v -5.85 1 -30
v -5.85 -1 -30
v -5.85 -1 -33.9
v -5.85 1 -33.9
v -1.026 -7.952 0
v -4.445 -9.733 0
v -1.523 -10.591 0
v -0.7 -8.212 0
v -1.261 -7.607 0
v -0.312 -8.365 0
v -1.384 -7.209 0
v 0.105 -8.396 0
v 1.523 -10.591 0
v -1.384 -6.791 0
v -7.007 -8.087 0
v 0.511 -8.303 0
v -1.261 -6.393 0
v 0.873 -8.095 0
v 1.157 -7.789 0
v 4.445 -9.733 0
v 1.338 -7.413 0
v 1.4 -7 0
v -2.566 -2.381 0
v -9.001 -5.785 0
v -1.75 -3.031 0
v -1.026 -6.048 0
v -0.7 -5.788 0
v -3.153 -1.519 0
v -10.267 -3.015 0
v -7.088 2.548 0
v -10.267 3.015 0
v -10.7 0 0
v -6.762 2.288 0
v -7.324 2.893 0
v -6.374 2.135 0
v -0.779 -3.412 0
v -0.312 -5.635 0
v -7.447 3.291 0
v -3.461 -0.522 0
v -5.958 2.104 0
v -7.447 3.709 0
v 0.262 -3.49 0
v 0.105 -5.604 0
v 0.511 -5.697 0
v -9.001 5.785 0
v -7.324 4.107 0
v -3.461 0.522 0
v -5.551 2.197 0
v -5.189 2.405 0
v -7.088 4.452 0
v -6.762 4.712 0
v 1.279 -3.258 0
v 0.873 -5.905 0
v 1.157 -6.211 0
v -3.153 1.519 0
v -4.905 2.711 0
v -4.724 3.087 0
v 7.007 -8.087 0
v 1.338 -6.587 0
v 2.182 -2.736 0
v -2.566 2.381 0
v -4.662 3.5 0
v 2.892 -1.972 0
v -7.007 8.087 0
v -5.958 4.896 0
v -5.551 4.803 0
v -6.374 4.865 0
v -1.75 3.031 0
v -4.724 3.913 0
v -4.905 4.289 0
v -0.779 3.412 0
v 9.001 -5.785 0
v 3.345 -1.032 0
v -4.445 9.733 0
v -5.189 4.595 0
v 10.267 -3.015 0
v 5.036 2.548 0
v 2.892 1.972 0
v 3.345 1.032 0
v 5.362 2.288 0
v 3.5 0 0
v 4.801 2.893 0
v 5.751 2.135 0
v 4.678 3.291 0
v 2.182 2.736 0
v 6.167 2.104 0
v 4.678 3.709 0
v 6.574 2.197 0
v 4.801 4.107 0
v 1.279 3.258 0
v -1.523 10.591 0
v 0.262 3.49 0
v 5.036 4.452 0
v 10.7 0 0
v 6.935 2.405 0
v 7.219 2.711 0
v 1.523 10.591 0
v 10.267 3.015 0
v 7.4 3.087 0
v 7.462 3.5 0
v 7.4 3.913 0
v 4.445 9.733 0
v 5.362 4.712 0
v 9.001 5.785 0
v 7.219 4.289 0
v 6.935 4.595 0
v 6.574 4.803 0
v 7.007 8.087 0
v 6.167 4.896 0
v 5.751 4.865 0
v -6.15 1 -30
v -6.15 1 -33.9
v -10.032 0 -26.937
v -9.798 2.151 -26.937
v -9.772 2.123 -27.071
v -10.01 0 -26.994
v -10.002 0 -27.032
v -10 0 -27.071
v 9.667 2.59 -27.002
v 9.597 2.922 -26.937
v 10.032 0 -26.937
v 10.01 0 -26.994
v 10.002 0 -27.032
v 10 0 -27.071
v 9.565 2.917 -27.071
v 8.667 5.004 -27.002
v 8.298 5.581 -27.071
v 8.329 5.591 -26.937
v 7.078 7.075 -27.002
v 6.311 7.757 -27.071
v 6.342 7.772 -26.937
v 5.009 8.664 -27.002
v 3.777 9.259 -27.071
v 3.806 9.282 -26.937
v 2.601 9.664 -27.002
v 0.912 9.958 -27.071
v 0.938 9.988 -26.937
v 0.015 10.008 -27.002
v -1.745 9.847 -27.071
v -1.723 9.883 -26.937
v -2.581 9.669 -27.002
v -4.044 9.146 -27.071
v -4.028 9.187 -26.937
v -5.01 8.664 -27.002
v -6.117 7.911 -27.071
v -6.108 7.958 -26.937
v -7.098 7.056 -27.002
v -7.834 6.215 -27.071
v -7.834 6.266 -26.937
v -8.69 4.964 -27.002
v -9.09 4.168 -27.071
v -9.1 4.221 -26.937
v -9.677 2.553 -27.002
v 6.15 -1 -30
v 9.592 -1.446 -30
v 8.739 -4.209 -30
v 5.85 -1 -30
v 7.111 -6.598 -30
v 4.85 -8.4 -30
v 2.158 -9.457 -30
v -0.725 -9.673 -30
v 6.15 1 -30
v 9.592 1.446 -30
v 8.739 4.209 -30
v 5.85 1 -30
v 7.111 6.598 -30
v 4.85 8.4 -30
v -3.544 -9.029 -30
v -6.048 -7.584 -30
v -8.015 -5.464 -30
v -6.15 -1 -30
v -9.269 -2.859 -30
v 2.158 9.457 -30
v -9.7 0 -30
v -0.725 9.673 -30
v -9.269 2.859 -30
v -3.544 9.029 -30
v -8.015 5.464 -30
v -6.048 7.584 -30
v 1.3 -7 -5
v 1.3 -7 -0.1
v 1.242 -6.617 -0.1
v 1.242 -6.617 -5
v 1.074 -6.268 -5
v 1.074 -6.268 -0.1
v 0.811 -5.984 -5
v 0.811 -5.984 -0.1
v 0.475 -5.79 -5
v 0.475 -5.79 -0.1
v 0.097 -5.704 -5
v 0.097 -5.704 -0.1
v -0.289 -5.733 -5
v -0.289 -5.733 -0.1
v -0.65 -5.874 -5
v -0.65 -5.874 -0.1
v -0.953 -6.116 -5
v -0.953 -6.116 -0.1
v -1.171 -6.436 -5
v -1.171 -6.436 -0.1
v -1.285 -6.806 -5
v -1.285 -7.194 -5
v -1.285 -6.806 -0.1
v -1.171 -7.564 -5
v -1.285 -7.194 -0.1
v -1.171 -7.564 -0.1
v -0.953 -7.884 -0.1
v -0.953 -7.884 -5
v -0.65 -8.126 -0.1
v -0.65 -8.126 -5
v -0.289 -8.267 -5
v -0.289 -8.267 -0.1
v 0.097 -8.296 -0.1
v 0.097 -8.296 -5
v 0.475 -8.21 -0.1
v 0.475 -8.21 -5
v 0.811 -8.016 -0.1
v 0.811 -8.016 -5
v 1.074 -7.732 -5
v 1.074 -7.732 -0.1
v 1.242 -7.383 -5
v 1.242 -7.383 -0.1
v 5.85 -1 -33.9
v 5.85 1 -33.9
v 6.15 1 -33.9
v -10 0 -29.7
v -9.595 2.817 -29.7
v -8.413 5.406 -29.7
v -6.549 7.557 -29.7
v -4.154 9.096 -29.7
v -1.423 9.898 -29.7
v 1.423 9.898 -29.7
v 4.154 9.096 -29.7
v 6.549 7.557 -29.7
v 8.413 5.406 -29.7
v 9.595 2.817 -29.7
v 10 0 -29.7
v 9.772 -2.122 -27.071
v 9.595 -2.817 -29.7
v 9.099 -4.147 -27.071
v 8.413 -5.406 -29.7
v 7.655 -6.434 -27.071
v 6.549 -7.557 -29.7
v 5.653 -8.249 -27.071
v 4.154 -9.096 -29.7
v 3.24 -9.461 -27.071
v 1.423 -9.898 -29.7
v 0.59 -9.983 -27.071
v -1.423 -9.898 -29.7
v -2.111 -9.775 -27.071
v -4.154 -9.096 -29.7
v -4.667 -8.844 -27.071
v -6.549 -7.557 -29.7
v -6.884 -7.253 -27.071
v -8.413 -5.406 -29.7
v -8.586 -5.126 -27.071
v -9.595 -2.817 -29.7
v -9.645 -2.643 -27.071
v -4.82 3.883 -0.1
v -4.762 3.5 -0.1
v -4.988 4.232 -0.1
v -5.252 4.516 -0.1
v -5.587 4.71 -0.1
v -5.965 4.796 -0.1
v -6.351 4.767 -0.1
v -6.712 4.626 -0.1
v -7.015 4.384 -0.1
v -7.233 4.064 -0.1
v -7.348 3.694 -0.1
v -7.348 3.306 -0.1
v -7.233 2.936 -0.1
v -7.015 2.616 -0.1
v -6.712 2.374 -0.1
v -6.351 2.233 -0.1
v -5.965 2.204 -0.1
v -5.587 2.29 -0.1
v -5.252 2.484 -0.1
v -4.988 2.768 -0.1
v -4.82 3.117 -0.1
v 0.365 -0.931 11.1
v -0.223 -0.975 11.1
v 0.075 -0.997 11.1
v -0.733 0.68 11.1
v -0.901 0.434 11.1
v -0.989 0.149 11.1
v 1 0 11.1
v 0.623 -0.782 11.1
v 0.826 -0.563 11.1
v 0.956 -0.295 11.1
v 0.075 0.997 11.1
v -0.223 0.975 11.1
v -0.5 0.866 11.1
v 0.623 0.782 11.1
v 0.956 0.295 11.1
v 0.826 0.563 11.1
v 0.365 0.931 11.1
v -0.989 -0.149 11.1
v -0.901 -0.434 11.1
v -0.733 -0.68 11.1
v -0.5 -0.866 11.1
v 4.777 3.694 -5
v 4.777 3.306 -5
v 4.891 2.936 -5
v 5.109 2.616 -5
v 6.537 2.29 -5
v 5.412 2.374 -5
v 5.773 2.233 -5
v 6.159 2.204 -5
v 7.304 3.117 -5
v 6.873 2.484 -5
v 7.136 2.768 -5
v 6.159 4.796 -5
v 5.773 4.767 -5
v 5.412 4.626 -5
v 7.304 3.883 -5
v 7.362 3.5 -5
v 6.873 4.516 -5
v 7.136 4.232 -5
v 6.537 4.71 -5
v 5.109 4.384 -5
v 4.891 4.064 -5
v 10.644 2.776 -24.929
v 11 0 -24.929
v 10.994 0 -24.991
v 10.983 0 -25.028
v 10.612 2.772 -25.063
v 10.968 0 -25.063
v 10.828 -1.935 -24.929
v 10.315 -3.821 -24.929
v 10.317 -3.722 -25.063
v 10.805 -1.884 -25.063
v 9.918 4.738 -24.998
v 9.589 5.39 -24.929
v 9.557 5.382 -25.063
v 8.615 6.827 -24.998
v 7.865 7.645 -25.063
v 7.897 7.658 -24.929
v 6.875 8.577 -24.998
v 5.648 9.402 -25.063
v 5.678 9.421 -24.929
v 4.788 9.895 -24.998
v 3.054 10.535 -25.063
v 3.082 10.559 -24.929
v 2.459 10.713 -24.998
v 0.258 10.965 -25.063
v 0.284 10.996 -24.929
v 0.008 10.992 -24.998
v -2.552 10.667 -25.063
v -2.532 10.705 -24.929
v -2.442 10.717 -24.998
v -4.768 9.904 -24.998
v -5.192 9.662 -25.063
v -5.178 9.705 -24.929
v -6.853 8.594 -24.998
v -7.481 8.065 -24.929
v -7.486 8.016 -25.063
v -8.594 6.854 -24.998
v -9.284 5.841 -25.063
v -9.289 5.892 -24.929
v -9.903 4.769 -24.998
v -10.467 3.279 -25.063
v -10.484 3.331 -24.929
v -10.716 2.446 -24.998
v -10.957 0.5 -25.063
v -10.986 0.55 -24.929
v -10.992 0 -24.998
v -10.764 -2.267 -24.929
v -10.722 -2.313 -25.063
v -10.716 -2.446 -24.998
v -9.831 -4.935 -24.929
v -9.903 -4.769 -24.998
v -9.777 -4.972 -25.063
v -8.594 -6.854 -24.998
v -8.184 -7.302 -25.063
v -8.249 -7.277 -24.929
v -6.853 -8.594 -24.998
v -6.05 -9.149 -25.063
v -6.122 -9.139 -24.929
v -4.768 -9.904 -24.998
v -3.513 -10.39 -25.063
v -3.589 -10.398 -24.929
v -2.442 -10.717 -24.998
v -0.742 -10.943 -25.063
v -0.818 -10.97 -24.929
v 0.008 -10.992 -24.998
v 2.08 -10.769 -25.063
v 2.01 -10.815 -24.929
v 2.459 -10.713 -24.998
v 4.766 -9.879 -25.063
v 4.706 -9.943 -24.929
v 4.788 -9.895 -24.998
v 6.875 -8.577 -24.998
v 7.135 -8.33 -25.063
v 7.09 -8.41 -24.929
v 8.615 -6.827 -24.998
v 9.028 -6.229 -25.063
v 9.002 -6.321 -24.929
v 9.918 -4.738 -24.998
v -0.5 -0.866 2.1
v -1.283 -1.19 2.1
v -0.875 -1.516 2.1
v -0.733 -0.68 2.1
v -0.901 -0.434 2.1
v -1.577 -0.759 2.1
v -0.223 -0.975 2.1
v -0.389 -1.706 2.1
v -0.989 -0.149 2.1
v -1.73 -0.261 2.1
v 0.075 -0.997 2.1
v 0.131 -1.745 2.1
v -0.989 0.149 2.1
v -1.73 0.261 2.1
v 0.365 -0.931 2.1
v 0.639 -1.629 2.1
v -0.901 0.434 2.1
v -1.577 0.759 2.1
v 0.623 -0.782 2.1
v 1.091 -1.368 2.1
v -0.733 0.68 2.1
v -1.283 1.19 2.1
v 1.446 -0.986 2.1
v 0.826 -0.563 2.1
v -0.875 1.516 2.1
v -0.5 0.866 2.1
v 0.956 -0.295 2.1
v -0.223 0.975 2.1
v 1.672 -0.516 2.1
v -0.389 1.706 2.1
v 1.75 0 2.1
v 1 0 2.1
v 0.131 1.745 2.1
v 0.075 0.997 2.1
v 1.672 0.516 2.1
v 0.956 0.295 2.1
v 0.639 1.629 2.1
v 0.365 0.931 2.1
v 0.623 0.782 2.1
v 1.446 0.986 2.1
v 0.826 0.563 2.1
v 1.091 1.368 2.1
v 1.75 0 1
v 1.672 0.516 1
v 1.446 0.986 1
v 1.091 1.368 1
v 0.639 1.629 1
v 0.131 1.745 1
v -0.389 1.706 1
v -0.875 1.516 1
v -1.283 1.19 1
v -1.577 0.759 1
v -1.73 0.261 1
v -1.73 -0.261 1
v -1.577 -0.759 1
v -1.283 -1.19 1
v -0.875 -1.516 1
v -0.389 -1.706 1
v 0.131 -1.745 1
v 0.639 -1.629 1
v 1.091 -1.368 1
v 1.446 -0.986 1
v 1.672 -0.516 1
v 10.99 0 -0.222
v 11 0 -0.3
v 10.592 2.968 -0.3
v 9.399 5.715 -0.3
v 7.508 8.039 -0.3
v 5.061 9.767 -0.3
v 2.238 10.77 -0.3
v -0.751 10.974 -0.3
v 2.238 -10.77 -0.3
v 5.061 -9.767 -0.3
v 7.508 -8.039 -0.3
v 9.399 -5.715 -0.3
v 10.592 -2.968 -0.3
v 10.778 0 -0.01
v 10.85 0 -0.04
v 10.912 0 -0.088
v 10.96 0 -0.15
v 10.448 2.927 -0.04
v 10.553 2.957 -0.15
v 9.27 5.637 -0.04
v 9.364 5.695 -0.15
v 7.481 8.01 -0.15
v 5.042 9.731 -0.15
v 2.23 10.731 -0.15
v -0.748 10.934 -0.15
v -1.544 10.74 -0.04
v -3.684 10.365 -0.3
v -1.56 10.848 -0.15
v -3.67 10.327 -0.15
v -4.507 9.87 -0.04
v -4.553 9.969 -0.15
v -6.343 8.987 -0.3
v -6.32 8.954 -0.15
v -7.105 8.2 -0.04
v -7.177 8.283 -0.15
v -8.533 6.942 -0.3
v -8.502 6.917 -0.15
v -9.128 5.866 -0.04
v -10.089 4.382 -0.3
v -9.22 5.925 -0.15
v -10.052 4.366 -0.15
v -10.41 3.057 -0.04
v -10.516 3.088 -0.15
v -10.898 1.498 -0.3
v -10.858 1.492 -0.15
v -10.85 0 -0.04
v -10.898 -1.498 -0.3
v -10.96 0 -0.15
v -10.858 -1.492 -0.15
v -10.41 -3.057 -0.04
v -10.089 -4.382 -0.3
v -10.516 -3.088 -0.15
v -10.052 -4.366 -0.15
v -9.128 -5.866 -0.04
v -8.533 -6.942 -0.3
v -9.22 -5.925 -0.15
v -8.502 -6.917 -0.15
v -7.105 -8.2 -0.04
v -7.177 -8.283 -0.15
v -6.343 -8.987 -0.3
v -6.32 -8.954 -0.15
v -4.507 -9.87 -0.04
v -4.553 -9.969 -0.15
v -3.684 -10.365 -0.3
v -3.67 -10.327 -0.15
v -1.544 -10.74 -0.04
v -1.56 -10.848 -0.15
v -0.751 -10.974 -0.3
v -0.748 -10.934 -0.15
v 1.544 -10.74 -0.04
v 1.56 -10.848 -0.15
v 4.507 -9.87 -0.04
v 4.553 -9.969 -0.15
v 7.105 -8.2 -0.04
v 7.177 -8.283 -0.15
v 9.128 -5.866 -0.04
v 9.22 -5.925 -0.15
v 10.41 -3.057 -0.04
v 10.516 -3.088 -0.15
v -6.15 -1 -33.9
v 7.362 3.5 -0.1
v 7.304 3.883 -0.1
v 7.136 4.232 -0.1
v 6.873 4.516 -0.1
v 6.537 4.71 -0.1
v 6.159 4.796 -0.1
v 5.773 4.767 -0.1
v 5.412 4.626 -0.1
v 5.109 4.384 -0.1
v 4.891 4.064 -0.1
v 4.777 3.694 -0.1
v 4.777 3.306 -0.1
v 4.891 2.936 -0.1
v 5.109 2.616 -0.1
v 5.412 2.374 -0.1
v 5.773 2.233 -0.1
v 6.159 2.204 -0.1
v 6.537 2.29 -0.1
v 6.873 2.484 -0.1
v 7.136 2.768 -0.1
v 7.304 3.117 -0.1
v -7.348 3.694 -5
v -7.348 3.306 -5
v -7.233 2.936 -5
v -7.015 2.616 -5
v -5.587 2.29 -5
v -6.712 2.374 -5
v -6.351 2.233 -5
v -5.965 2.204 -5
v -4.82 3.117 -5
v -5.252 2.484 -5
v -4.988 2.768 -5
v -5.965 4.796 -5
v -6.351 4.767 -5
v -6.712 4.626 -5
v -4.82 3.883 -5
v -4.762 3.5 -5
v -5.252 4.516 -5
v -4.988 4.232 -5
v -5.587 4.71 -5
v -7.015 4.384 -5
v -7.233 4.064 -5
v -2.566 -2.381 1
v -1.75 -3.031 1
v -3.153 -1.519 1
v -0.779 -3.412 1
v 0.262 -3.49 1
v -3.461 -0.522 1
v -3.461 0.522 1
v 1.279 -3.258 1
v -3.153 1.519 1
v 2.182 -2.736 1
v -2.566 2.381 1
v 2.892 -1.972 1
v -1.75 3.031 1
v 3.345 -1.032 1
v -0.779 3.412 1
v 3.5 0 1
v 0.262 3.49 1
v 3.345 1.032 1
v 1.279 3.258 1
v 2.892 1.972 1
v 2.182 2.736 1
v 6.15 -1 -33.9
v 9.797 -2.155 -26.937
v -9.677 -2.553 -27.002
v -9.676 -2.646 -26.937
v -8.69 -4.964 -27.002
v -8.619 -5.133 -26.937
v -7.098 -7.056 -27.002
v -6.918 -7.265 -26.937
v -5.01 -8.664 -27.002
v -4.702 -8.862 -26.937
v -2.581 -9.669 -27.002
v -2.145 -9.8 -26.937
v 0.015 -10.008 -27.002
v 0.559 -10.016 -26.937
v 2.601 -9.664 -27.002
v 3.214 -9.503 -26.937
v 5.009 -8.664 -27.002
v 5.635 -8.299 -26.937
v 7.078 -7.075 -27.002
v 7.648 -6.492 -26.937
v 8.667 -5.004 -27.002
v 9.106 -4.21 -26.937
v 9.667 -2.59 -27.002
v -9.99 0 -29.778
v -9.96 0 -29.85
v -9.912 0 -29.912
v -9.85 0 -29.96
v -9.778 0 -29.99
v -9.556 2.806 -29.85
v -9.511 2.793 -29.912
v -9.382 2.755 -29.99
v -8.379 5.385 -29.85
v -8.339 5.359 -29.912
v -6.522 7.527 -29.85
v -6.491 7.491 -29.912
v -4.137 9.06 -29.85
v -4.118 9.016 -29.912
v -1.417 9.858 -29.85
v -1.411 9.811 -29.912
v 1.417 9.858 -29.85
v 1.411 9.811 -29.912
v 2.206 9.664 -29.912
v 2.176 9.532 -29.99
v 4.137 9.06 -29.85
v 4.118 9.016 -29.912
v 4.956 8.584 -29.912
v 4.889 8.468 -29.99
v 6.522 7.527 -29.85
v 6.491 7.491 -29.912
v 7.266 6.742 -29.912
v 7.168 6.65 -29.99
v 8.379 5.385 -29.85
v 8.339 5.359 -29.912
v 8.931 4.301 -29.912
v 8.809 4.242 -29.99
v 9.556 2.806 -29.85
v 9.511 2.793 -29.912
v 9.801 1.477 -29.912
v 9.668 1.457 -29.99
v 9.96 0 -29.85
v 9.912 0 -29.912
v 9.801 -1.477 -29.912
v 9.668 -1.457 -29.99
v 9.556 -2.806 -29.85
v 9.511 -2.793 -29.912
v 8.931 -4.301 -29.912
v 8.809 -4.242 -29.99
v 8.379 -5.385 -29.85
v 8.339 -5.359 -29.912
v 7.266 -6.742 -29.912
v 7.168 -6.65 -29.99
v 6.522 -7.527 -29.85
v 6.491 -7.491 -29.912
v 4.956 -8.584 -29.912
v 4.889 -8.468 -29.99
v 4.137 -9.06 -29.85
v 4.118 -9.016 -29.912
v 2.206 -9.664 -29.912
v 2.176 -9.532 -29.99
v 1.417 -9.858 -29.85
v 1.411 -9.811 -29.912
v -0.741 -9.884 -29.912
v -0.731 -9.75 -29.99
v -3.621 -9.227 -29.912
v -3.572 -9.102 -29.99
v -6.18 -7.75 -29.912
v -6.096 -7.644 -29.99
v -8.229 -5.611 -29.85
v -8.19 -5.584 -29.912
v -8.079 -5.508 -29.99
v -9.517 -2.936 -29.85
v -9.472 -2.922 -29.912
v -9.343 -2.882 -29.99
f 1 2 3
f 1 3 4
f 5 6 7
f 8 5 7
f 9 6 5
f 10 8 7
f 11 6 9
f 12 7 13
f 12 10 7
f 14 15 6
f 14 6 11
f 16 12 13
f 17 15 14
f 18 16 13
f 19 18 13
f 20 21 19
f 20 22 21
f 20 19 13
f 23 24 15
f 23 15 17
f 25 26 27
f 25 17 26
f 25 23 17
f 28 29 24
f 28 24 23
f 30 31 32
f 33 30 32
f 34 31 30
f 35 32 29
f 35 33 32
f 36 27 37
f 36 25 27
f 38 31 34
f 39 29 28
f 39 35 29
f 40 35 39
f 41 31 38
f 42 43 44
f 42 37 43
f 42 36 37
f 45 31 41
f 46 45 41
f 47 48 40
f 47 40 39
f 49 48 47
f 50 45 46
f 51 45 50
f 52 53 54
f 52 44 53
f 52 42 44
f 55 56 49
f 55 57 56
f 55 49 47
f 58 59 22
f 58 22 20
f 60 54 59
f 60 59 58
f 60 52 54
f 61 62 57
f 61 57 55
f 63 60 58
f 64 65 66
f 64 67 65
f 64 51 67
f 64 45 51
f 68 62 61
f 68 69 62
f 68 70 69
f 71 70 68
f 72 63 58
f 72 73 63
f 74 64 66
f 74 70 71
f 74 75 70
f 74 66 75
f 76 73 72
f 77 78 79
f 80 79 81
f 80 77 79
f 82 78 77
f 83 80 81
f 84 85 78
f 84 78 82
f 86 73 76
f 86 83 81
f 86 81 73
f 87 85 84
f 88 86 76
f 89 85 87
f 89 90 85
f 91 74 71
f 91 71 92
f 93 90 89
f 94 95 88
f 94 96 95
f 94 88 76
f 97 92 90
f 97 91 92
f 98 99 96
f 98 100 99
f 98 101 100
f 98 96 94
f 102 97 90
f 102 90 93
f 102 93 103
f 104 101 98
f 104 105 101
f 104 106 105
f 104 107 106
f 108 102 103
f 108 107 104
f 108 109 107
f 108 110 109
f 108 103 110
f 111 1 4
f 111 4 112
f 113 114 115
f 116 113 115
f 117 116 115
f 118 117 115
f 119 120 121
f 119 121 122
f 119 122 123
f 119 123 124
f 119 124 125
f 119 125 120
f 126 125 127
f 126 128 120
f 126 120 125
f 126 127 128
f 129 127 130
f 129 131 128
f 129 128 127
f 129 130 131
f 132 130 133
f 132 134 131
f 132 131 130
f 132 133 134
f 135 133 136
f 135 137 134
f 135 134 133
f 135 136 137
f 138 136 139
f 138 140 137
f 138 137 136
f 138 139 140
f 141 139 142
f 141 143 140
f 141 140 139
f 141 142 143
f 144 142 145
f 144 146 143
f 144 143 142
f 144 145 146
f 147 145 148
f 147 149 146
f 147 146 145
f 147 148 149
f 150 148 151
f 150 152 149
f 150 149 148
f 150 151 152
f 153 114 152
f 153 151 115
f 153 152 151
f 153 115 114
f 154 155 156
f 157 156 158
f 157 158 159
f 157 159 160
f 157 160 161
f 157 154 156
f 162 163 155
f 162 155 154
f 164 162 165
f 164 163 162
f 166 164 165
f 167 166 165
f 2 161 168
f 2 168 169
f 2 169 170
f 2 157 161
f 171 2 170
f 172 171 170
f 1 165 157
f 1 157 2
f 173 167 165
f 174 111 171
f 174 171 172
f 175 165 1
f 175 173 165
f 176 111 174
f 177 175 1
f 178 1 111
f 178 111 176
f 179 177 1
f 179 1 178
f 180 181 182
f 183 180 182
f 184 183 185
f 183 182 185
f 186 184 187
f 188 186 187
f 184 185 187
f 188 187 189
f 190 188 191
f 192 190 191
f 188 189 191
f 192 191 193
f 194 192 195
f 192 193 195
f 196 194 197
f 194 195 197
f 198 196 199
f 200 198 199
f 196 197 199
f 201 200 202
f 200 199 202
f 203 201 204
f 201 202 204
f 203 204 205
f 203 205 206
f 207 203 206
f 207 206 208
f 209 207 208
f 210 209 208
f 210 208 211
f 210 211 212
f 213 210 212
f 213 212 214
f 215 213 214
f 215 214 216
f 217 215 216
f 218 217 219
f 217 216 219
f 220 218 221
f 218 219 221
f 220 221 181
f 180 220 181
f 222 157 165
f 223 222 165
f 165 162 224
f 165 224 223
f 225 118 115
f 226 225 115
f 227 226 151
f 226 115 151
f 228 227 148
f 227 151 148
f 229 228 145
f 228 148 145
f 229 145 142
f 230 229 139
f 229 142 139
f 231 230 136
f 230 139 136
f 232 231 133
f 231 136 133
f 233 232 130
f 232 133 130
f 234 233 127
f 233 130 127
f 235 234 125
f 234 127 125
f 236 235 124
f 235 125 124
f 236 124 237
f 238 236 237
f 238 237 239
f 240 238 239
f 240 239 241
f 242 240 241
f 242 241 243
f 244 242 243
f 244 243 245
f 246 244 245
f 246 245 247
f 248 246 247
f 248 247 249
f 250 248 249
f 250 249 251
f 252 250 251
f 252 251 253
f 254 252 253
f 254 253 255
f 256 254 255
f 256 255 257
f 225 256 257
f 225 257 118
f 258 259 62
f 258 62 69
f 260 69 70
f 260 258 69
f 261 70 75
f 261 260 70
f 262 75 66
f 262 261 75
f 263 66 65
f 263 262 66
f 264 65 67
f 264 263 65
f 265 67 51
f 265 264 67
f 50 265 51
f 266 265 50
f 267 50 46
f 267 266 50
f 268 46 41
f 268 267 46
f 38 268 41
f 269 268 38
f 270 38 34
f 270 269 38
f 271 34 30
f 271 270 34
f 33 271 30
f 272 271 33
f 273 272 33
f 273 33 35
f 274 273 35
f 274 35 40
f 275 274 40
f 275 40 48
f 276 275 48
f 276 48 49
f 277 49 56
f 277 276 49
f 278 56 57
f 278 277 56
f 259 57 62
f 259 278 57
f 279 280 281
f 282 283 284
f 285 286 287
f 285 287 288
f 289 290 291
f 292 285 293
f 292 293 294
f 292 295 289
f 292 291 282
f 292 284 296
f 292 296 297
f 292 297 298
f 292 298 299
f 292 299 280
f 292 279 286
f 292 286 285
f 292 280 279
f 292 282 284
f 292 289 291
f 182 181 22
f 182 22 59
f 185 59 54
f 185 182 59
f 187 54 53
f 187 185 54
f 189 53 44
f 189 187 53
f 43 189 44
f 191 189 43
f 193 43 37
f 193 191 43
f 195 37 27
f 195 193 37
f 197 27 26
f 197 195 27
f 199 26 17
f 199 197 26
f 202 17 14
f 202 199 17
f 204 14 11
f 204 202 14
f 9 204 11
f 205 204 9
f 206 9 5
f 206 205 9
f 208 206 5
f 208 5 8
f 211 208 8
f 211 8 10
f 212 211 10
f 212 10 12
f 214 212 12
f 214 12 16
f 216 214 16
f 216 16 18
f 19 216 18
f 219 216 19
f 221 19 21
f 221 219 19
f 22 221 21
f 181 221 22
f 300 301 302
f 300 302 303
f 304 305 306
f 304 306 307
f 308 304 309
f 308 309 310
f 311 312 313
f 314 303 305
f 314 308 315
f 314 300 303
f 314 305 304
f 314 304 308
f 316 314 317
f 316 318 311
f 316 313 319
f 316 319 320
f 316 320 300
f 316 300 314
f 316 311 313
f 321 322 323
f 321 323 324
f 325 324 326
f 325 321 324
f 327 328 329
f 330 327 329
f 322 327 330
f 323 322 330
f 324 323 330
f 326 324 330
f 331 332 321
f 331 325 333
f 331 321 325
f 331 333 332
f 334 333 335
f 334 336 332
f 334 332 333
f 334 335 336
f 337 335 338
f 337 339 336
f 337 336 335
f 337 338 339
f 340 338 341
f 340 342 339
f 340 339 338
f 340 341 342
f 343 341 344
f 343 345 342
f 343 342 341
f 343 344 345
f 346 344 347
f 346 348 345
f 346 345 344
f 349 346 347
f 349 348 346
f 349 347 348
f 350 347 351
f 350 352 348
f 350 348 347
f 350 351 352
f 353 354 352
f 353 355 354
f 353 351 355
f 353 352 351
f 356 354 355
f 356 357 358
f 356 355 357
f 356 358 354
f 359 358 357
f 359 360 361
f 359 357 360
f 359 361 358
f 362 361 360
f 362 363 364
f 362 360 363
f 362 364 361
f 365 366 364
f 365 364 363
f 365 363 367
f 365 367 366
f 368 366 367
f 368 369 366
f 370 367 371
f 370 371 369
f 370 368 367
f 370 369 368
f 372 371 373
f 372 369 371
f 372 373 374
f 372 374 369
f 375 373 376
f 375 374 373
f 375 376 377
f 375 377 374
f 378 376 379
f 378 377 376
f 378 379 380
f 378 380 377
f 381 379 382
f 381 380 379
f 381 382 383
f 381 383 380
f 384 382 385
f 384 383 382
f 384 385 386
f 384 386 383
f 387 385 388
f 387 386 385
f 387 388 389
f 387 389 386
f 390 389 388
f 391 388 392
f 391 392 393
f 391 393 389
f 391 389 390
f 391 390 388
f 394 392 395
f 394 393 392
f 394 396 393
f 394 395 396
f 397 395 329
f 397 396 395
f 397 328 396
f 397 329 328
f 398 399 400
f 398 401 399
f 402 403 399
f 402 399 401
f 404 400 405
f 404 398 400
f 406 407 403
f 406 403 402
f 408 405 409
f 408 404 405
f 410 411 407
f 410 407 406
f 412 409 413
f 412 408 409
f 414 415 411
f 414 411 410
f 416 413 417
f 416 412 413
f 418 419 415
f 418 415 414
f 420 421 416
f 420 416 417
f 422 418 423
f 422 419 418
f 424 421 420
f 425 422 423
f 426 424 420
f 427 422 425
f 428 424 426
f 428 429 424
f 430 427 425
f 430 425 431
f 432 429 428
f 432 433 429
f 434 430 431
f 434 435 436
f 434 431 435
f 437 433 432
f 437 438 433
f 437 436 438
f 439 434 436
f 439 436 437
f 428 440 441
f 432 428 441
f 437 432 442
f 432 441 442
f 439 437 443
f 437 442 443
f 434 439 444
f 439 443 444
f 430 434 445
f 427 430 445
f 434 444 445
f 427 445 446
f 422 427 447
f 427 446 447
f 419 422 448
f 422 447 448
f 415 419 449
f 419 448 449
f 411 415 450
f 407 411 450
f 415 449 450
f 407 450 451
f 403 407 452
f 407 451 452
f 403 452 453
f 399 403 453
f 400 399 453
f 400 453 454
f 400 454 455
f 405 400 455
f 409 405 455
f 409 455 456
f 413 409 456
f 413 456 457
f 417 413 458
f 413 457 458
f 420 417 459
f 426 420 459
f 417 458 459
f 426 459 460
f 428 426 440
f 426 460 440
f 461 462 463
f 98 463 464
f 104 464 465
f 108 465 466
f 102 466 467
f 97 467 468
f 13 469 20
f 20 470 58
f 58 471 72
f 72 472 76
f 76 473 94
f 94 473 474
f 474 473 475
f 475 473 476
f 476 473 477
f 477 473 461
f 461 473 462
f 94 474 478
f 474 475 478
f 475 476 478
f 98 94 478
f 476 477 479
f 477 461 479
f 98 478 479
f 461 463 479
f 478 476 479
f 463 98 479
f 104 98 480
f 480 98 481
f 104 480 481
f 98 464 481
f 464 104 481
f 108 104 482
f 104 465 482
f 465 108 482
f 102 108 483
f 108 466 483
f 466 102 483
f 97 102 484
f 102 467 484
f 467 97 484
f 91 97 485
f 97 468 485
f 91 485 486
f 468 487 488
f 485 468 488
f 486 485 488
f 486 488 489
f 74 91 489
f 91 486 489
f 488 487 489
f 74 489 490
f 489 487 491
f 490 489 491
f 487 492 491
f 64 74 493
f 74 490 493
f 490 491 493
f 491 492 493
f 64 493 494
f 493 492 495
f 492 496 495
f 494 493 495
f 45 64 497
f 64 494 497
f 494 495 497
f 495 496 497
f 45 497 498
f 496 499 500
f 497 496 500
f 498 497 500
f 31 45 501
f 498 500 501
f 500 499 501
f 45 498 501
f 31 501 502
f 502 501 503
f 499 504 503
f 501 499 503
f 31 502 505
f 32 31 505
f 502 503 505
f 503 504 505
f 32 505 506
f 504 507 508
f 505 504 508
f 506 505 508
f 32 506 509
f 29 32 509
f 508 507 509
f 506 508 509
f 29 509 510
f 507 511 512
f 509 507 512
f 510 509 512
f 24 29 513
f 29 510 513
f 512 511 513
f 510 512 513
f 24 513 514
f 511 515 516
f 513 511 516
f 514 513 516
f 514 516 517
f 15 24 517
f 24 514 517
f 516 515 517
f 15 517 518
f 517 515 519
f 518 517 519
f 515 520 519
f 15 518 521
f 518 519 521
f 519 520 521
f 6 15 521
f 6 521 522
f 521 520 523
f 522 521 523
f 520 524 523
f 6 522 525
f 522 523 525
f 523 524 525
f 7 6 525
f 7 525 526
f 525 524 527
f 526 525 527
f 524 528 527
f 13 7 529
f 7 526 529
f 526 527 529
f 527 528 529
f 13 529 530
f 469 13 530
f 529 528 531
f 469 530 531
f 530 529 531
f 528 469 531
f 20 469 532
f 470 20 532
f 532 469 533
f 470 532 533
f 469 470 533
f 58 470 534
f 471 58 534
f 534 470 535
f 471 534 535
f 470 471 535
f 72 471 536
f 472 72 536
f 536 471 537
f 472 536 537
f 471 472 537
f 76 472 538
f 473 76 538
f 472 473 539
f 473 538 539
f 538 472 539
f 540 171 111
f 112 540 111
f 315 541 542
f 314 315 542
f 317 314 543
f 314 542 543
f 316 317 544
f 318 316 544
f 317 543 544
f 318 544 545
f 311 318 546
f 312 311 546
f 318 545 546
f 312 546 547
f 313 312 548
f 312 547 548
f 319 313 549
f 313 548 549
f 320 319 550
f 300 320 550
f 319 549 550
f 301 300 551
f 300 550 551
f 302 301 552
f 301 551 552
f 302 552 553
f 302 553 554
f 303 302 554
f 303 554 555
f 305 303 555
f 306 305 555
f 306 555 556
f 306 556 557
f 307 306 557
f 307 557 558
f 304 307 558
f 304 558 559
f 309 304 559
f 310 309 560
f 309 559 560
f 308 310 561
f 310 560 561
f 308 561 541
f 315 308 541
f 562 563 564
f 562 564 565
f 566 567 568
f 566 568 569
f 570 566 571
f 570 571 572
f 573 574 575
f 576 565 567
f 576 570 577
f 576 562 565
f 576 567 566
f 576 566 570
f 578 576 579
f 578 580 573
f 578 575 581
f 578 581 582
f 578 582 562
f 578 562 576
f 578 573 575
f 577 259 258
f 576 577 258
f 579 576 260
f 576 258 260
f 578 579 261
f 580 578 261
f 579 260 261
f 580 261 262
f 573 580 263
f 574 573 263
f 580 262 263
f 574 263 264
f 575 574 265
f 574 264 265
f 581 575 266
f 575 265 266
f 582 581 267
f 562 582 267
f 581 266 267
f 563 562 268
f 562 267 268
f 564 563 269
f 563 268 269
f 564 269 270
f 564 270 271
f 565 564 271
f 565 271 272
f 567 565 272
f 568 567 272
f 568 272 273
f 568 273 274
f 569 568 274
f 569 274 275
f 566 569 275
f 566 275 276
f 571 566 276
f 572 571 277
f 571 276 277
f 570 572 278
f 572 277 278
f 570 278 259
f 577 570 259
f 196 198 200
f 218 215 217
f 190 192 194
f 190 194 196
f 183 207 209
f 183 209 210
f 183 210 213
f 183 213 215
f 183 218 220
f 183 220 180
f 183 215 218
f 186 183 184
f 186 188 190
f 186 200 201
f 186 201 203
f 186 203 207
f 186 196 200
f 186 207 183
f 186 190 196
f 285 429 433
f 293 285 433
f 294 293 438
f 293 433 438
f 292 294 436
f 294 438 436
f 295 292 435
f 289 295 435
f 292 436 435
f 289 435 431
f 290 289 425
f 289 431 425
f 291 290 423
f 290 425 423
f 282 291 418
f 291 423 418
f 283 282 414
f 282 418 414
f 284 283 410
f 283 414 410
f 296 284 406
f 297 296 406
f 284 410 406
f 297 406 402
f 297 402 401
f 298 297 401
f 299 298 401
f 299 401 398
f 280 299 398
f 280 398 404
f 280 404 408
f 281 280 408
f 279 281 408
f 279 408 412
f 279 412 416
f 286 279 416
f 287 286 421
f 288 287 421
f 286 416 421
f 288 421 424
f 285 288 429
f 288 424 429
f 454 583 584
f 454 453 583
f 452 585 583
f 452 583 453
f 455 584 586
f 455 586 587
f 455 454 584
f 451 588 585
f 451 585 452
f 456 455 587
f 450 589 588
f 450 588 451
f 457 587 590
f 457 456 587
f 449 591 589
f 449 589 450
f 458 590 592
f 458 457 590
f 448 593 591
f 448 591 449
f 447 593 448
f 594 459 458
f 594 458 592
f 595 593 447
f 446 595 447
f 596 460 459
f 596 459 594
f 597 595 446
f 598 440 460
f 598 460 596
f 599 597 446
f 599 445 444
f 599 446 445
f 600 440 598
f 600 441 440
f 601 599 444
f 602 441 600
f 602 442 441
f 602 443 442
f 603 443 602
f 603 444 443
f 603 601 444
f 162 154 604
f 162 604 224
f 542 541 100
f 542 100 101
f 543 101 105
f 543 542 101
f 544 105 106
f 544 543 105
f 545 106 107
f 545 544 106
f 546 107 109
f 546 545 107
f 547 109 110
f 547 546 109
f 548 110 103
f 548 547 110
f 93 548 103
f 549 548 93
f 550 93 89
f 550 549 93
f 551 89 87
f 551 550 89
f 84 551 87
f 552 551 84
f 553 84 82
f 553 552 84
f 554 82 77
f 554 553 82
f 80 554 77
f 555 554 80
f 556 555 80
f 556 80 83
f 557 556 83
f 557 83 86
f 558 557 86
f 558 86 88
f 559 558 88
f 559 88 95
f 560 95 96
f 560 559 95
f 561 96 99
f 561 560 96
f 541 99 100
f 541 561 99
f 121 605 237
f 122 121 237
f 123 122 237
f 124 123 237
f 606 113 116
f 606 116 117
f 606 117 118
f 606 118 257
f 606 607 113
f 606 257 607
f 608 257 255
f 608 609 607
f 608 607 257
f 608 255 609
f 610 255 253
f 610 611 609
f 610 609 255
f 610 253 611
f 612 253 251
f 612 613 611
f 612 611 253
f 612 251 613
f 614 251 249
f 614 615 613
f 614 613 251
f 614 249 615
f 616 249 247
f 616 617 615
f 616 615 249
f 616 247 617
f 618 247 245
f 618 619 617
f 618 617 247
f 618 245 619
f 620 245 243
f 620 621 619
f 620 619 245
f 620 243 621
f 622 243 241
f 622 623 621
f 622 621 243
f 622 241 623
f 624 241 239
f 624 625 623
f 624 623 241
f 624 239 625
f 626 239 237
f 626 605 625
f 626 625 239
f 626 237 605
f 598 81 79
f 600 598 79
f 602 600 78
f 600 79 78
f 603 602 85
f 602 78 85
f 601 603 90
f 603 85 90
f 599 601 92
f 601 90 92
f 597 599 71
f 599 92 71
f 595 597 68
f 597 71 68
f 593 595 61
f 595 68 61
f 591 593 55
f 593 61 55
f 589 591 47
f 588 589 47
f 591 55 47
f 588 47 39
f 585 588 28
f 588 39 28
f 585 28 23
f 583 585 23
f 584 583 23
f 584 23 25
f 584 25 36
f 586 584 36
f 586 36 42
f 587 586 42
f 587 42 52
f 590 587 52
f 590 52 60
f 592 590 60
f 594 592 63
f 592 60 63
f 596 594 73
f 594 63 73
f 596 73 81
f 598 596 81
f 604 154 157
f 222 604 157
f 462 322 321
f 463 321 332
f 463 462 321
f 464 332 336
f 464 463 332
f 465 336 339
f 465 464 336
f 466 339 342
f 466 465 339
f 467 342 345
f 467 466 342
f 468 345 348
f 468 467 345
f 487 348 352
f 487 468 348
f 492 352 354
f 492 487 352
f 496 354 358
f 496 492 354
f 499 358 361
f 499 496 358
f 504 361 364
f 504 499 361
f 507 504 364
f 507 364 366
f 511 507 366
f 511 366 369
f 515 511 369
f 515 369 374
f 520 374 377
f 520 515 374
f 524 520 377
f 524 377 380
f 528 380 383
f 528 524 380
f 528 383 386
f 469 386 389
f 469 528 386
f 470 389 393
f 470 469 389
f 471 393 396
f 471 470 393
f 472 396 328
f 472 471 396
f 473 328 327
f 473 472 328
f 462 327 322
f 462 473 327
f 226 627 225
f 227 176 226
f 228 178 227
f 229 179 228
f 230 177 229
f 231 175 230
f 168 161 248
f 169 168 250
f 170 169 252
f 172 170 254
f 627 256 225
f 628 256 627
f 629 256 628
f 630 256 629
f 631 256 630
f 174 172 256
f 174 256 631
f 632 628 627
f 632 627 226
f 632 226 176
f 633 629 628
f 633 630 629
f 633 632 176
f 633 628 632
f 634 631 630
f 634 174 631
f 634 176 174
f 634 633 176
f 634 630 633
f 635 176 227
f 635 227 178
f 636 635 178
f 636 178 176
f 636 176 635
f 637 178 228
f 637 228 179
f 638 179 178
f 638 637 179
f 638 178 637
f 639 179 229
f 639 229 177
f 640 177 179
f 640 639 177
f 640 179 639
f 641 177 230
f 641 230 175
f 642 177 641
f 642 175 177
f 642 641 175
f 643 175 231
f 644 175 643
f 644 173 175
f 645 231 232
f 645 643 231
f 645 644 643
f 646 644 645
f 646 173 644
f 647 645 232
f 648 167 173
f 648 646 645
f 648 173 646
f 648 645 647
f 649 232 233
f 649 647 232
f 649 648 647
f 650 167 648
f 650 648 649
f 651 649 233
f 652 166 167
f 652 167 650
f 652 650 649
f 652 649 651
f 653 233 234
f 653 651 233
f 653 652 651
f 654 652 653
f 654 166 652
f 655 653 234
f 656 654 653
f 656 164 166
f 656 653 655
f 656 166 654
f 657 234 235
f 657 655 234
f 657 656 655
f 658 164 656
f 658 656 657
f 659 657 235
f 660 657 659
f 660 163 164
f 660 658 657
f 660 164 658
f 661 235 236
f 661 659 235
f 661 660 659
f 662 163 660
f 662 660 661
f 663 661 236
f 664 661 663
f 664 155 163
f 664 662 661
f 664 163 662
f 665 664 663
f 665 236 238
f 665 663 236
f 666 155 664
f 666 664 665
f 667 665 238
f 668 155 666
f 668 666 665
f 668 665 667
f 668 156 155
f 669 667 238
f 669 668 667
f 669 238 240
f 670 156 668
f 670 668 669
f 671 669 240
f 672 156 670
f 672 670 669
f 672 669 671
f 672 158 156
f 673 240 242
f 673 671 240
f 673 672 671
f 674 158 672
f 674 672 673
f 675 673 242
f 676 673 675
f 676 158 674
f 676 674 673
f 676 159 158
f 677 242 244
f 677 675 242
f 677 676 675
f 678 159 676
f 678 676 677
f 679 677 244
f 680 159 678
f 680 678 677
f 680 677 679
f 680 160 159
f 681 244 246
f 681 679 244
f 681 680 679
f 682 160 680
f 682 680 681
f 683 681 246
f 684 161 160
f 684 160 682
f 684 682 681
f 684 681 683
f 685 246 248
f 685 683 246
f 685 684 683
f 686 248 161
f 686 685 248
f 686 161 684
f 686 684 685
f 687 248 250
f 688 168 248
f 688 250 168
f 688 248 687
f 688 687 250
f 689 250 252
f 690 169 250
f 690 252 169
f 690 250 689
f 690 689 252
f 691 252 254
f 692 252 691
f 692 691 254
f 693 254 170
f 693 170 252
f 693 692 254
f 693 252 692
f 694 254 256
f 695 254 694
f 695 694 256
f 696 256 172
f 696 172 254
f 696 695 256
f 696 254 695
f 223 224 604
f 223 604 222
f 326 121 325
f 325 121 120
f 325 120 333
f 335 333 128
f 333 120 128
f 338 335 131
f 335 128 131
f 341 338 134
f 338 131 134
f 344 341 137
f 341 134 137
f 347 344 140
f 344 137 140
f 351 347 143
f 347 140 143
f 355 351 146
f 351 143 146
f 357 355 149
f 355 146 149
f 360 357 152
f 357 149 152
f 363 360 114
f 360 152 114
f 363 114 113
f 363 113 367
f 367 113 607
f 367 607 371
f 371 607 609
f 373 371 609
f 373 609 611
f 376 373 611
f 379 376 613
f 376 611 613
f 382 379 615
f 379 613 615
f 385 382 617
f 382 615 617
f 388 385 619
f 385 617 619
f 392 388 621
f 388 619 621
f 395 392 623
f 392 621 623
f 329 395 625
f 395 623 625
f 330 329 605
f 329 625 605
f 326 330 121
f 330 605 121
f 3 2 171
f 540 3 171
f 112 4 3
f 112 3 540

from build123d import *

# Parameters (mm, degrees)
SKETCH1_R           = 11
BOSS_EXTRUDE1_DEPTH = 25
SKETCH2_R           = 10
SKETCH3_R           = 10
BOSS_EXTRUDE2_DEPTH = 3
SKETCH4_R           = 1.3
CUT_EXTRUDE1_DEPTH  = 5
CHAMFER1_SIZE       = 0.1
SKETCH5_R           = 3.5
BOSS_EXTRUDE3_DEPTH = 1
SKETCH6_R           = 1.75
BOSS_EXTRUDE4_DEPTH = 1.1
SKETCH7_R           = 1
BOSS_EXTRUDE5_DEPTH = 9
SKETCH8_W           = 0.3
SKETCH8_H           = 2
BOSS_EXTRUDE6_DEPTH = 3.9
FILLET1_R           = 0.3


with BuildPart() as part:
    # Sketch1 → Boss-Extrude1 (new body)
    with BuildSketch(Plane.XY):
        Circle(SKETCH1_R)
    extrude(amount=-BOSS_EXTRUDE1_DEPTH)

    # Sketch2 → section 1 of loft1
    with BuildSketch(Plane(origin=(0, 0, -27), x_dir=(-1, 0, 0), z_dir=(0, 0, -1)), mode=Mode.PRIVATE) as loft1_s1:
        Circle(SKETCH2_R)
    # loft from a face of the part (loft1)
    loft([part.faces().sort_by_distance((0, 0, -25))[0], loft1_s1.sketch])

    # Sketch3 → Boss-Extrude2 (add)
    with BuildSketch(Plane(origin=(0, 0, -27), x_dir=(-1, 0, 0), z_dir=(0, 0, -1))):
        Circle(SKETCH3_R)
    extrude(amount=BOSS_EXTRUDE2_DEPTH)

    # Sketch4 → Cut-Extrude1 (cut)
    with BuildSketch(Plane.XY):
        with Locations((-6.062177826, 3.5)):
            Circle(SKETCH4_R)
        with Locations((6.062177826, 3.5)):
            Circle(SKETCH4_R)
        with Locations((0, -7)):
            Circle(SKETCH4_R)
    extrude(amount=-CUT_EXTRUDE1_DEPTH, mode=Mode.SUBTRACT)

    # Chamfer1
    chamfer1_edges = [part.edges().sort_by_distance(p)[0] for p in [
        (-7.362177826, 3.5, 0),
        (4.762177826, 3.5, 0),
        (-1.3, -7, 0),
    ]]
    chamfer(chamfer1_edges, length=CHAMFER1_SIZE)

    # Sketch5 → Boss-Extrude3 (add)
    with BuildSketch(Plane.XY):
        Circle(SKETCH5_R)
    extrude(amount=BOSS_EXTRUDE3_DEPTH)

    # Sketch6 → Boss-Extrude4 (add)
    with BuildSketch(Plane.XY.offset(1)):
        Circle(SKETCH6_R)
    extrude(amount=BOSS_EXTRUDE4_DEPTH)

    # Sketch7 → Boss-Extrude5 (add)
    with BuildSketch(Plane.XY.offset(2.1)):
        Circle(SKETCH7_R)
    extrude(amount=BOSS_EXTRUDE5_DEPTH)

    # Sketch8 → Boss-Extrude6 (add)
    with BuildSketch(Plane(origin=(0, 0, -30), x_dir=(-1, 0, 0), z_dir=(0, 0, -1))):
        with Locations((-6, 0)):
            Rectangle(SKETCH8_W, SKETCH8_H)
        with Locations((6, 0)):
            Rectangle(SKETCH8_W, SKETCH8_H)
    extrude(amount=BOSS_EXTRUDE6_DEPTH)

    # Fillet1
    fillet1_edges = [part.edges().sort_by_distance(p)[0] for p in [
        (10, 0, -30),
        (-11, 0, 0),
        (0, 10, -27),
        (-11, 0, -25),
    ]]
    fillet(fillet1_edges, radius=FILLET1_R)


solid = part.part
